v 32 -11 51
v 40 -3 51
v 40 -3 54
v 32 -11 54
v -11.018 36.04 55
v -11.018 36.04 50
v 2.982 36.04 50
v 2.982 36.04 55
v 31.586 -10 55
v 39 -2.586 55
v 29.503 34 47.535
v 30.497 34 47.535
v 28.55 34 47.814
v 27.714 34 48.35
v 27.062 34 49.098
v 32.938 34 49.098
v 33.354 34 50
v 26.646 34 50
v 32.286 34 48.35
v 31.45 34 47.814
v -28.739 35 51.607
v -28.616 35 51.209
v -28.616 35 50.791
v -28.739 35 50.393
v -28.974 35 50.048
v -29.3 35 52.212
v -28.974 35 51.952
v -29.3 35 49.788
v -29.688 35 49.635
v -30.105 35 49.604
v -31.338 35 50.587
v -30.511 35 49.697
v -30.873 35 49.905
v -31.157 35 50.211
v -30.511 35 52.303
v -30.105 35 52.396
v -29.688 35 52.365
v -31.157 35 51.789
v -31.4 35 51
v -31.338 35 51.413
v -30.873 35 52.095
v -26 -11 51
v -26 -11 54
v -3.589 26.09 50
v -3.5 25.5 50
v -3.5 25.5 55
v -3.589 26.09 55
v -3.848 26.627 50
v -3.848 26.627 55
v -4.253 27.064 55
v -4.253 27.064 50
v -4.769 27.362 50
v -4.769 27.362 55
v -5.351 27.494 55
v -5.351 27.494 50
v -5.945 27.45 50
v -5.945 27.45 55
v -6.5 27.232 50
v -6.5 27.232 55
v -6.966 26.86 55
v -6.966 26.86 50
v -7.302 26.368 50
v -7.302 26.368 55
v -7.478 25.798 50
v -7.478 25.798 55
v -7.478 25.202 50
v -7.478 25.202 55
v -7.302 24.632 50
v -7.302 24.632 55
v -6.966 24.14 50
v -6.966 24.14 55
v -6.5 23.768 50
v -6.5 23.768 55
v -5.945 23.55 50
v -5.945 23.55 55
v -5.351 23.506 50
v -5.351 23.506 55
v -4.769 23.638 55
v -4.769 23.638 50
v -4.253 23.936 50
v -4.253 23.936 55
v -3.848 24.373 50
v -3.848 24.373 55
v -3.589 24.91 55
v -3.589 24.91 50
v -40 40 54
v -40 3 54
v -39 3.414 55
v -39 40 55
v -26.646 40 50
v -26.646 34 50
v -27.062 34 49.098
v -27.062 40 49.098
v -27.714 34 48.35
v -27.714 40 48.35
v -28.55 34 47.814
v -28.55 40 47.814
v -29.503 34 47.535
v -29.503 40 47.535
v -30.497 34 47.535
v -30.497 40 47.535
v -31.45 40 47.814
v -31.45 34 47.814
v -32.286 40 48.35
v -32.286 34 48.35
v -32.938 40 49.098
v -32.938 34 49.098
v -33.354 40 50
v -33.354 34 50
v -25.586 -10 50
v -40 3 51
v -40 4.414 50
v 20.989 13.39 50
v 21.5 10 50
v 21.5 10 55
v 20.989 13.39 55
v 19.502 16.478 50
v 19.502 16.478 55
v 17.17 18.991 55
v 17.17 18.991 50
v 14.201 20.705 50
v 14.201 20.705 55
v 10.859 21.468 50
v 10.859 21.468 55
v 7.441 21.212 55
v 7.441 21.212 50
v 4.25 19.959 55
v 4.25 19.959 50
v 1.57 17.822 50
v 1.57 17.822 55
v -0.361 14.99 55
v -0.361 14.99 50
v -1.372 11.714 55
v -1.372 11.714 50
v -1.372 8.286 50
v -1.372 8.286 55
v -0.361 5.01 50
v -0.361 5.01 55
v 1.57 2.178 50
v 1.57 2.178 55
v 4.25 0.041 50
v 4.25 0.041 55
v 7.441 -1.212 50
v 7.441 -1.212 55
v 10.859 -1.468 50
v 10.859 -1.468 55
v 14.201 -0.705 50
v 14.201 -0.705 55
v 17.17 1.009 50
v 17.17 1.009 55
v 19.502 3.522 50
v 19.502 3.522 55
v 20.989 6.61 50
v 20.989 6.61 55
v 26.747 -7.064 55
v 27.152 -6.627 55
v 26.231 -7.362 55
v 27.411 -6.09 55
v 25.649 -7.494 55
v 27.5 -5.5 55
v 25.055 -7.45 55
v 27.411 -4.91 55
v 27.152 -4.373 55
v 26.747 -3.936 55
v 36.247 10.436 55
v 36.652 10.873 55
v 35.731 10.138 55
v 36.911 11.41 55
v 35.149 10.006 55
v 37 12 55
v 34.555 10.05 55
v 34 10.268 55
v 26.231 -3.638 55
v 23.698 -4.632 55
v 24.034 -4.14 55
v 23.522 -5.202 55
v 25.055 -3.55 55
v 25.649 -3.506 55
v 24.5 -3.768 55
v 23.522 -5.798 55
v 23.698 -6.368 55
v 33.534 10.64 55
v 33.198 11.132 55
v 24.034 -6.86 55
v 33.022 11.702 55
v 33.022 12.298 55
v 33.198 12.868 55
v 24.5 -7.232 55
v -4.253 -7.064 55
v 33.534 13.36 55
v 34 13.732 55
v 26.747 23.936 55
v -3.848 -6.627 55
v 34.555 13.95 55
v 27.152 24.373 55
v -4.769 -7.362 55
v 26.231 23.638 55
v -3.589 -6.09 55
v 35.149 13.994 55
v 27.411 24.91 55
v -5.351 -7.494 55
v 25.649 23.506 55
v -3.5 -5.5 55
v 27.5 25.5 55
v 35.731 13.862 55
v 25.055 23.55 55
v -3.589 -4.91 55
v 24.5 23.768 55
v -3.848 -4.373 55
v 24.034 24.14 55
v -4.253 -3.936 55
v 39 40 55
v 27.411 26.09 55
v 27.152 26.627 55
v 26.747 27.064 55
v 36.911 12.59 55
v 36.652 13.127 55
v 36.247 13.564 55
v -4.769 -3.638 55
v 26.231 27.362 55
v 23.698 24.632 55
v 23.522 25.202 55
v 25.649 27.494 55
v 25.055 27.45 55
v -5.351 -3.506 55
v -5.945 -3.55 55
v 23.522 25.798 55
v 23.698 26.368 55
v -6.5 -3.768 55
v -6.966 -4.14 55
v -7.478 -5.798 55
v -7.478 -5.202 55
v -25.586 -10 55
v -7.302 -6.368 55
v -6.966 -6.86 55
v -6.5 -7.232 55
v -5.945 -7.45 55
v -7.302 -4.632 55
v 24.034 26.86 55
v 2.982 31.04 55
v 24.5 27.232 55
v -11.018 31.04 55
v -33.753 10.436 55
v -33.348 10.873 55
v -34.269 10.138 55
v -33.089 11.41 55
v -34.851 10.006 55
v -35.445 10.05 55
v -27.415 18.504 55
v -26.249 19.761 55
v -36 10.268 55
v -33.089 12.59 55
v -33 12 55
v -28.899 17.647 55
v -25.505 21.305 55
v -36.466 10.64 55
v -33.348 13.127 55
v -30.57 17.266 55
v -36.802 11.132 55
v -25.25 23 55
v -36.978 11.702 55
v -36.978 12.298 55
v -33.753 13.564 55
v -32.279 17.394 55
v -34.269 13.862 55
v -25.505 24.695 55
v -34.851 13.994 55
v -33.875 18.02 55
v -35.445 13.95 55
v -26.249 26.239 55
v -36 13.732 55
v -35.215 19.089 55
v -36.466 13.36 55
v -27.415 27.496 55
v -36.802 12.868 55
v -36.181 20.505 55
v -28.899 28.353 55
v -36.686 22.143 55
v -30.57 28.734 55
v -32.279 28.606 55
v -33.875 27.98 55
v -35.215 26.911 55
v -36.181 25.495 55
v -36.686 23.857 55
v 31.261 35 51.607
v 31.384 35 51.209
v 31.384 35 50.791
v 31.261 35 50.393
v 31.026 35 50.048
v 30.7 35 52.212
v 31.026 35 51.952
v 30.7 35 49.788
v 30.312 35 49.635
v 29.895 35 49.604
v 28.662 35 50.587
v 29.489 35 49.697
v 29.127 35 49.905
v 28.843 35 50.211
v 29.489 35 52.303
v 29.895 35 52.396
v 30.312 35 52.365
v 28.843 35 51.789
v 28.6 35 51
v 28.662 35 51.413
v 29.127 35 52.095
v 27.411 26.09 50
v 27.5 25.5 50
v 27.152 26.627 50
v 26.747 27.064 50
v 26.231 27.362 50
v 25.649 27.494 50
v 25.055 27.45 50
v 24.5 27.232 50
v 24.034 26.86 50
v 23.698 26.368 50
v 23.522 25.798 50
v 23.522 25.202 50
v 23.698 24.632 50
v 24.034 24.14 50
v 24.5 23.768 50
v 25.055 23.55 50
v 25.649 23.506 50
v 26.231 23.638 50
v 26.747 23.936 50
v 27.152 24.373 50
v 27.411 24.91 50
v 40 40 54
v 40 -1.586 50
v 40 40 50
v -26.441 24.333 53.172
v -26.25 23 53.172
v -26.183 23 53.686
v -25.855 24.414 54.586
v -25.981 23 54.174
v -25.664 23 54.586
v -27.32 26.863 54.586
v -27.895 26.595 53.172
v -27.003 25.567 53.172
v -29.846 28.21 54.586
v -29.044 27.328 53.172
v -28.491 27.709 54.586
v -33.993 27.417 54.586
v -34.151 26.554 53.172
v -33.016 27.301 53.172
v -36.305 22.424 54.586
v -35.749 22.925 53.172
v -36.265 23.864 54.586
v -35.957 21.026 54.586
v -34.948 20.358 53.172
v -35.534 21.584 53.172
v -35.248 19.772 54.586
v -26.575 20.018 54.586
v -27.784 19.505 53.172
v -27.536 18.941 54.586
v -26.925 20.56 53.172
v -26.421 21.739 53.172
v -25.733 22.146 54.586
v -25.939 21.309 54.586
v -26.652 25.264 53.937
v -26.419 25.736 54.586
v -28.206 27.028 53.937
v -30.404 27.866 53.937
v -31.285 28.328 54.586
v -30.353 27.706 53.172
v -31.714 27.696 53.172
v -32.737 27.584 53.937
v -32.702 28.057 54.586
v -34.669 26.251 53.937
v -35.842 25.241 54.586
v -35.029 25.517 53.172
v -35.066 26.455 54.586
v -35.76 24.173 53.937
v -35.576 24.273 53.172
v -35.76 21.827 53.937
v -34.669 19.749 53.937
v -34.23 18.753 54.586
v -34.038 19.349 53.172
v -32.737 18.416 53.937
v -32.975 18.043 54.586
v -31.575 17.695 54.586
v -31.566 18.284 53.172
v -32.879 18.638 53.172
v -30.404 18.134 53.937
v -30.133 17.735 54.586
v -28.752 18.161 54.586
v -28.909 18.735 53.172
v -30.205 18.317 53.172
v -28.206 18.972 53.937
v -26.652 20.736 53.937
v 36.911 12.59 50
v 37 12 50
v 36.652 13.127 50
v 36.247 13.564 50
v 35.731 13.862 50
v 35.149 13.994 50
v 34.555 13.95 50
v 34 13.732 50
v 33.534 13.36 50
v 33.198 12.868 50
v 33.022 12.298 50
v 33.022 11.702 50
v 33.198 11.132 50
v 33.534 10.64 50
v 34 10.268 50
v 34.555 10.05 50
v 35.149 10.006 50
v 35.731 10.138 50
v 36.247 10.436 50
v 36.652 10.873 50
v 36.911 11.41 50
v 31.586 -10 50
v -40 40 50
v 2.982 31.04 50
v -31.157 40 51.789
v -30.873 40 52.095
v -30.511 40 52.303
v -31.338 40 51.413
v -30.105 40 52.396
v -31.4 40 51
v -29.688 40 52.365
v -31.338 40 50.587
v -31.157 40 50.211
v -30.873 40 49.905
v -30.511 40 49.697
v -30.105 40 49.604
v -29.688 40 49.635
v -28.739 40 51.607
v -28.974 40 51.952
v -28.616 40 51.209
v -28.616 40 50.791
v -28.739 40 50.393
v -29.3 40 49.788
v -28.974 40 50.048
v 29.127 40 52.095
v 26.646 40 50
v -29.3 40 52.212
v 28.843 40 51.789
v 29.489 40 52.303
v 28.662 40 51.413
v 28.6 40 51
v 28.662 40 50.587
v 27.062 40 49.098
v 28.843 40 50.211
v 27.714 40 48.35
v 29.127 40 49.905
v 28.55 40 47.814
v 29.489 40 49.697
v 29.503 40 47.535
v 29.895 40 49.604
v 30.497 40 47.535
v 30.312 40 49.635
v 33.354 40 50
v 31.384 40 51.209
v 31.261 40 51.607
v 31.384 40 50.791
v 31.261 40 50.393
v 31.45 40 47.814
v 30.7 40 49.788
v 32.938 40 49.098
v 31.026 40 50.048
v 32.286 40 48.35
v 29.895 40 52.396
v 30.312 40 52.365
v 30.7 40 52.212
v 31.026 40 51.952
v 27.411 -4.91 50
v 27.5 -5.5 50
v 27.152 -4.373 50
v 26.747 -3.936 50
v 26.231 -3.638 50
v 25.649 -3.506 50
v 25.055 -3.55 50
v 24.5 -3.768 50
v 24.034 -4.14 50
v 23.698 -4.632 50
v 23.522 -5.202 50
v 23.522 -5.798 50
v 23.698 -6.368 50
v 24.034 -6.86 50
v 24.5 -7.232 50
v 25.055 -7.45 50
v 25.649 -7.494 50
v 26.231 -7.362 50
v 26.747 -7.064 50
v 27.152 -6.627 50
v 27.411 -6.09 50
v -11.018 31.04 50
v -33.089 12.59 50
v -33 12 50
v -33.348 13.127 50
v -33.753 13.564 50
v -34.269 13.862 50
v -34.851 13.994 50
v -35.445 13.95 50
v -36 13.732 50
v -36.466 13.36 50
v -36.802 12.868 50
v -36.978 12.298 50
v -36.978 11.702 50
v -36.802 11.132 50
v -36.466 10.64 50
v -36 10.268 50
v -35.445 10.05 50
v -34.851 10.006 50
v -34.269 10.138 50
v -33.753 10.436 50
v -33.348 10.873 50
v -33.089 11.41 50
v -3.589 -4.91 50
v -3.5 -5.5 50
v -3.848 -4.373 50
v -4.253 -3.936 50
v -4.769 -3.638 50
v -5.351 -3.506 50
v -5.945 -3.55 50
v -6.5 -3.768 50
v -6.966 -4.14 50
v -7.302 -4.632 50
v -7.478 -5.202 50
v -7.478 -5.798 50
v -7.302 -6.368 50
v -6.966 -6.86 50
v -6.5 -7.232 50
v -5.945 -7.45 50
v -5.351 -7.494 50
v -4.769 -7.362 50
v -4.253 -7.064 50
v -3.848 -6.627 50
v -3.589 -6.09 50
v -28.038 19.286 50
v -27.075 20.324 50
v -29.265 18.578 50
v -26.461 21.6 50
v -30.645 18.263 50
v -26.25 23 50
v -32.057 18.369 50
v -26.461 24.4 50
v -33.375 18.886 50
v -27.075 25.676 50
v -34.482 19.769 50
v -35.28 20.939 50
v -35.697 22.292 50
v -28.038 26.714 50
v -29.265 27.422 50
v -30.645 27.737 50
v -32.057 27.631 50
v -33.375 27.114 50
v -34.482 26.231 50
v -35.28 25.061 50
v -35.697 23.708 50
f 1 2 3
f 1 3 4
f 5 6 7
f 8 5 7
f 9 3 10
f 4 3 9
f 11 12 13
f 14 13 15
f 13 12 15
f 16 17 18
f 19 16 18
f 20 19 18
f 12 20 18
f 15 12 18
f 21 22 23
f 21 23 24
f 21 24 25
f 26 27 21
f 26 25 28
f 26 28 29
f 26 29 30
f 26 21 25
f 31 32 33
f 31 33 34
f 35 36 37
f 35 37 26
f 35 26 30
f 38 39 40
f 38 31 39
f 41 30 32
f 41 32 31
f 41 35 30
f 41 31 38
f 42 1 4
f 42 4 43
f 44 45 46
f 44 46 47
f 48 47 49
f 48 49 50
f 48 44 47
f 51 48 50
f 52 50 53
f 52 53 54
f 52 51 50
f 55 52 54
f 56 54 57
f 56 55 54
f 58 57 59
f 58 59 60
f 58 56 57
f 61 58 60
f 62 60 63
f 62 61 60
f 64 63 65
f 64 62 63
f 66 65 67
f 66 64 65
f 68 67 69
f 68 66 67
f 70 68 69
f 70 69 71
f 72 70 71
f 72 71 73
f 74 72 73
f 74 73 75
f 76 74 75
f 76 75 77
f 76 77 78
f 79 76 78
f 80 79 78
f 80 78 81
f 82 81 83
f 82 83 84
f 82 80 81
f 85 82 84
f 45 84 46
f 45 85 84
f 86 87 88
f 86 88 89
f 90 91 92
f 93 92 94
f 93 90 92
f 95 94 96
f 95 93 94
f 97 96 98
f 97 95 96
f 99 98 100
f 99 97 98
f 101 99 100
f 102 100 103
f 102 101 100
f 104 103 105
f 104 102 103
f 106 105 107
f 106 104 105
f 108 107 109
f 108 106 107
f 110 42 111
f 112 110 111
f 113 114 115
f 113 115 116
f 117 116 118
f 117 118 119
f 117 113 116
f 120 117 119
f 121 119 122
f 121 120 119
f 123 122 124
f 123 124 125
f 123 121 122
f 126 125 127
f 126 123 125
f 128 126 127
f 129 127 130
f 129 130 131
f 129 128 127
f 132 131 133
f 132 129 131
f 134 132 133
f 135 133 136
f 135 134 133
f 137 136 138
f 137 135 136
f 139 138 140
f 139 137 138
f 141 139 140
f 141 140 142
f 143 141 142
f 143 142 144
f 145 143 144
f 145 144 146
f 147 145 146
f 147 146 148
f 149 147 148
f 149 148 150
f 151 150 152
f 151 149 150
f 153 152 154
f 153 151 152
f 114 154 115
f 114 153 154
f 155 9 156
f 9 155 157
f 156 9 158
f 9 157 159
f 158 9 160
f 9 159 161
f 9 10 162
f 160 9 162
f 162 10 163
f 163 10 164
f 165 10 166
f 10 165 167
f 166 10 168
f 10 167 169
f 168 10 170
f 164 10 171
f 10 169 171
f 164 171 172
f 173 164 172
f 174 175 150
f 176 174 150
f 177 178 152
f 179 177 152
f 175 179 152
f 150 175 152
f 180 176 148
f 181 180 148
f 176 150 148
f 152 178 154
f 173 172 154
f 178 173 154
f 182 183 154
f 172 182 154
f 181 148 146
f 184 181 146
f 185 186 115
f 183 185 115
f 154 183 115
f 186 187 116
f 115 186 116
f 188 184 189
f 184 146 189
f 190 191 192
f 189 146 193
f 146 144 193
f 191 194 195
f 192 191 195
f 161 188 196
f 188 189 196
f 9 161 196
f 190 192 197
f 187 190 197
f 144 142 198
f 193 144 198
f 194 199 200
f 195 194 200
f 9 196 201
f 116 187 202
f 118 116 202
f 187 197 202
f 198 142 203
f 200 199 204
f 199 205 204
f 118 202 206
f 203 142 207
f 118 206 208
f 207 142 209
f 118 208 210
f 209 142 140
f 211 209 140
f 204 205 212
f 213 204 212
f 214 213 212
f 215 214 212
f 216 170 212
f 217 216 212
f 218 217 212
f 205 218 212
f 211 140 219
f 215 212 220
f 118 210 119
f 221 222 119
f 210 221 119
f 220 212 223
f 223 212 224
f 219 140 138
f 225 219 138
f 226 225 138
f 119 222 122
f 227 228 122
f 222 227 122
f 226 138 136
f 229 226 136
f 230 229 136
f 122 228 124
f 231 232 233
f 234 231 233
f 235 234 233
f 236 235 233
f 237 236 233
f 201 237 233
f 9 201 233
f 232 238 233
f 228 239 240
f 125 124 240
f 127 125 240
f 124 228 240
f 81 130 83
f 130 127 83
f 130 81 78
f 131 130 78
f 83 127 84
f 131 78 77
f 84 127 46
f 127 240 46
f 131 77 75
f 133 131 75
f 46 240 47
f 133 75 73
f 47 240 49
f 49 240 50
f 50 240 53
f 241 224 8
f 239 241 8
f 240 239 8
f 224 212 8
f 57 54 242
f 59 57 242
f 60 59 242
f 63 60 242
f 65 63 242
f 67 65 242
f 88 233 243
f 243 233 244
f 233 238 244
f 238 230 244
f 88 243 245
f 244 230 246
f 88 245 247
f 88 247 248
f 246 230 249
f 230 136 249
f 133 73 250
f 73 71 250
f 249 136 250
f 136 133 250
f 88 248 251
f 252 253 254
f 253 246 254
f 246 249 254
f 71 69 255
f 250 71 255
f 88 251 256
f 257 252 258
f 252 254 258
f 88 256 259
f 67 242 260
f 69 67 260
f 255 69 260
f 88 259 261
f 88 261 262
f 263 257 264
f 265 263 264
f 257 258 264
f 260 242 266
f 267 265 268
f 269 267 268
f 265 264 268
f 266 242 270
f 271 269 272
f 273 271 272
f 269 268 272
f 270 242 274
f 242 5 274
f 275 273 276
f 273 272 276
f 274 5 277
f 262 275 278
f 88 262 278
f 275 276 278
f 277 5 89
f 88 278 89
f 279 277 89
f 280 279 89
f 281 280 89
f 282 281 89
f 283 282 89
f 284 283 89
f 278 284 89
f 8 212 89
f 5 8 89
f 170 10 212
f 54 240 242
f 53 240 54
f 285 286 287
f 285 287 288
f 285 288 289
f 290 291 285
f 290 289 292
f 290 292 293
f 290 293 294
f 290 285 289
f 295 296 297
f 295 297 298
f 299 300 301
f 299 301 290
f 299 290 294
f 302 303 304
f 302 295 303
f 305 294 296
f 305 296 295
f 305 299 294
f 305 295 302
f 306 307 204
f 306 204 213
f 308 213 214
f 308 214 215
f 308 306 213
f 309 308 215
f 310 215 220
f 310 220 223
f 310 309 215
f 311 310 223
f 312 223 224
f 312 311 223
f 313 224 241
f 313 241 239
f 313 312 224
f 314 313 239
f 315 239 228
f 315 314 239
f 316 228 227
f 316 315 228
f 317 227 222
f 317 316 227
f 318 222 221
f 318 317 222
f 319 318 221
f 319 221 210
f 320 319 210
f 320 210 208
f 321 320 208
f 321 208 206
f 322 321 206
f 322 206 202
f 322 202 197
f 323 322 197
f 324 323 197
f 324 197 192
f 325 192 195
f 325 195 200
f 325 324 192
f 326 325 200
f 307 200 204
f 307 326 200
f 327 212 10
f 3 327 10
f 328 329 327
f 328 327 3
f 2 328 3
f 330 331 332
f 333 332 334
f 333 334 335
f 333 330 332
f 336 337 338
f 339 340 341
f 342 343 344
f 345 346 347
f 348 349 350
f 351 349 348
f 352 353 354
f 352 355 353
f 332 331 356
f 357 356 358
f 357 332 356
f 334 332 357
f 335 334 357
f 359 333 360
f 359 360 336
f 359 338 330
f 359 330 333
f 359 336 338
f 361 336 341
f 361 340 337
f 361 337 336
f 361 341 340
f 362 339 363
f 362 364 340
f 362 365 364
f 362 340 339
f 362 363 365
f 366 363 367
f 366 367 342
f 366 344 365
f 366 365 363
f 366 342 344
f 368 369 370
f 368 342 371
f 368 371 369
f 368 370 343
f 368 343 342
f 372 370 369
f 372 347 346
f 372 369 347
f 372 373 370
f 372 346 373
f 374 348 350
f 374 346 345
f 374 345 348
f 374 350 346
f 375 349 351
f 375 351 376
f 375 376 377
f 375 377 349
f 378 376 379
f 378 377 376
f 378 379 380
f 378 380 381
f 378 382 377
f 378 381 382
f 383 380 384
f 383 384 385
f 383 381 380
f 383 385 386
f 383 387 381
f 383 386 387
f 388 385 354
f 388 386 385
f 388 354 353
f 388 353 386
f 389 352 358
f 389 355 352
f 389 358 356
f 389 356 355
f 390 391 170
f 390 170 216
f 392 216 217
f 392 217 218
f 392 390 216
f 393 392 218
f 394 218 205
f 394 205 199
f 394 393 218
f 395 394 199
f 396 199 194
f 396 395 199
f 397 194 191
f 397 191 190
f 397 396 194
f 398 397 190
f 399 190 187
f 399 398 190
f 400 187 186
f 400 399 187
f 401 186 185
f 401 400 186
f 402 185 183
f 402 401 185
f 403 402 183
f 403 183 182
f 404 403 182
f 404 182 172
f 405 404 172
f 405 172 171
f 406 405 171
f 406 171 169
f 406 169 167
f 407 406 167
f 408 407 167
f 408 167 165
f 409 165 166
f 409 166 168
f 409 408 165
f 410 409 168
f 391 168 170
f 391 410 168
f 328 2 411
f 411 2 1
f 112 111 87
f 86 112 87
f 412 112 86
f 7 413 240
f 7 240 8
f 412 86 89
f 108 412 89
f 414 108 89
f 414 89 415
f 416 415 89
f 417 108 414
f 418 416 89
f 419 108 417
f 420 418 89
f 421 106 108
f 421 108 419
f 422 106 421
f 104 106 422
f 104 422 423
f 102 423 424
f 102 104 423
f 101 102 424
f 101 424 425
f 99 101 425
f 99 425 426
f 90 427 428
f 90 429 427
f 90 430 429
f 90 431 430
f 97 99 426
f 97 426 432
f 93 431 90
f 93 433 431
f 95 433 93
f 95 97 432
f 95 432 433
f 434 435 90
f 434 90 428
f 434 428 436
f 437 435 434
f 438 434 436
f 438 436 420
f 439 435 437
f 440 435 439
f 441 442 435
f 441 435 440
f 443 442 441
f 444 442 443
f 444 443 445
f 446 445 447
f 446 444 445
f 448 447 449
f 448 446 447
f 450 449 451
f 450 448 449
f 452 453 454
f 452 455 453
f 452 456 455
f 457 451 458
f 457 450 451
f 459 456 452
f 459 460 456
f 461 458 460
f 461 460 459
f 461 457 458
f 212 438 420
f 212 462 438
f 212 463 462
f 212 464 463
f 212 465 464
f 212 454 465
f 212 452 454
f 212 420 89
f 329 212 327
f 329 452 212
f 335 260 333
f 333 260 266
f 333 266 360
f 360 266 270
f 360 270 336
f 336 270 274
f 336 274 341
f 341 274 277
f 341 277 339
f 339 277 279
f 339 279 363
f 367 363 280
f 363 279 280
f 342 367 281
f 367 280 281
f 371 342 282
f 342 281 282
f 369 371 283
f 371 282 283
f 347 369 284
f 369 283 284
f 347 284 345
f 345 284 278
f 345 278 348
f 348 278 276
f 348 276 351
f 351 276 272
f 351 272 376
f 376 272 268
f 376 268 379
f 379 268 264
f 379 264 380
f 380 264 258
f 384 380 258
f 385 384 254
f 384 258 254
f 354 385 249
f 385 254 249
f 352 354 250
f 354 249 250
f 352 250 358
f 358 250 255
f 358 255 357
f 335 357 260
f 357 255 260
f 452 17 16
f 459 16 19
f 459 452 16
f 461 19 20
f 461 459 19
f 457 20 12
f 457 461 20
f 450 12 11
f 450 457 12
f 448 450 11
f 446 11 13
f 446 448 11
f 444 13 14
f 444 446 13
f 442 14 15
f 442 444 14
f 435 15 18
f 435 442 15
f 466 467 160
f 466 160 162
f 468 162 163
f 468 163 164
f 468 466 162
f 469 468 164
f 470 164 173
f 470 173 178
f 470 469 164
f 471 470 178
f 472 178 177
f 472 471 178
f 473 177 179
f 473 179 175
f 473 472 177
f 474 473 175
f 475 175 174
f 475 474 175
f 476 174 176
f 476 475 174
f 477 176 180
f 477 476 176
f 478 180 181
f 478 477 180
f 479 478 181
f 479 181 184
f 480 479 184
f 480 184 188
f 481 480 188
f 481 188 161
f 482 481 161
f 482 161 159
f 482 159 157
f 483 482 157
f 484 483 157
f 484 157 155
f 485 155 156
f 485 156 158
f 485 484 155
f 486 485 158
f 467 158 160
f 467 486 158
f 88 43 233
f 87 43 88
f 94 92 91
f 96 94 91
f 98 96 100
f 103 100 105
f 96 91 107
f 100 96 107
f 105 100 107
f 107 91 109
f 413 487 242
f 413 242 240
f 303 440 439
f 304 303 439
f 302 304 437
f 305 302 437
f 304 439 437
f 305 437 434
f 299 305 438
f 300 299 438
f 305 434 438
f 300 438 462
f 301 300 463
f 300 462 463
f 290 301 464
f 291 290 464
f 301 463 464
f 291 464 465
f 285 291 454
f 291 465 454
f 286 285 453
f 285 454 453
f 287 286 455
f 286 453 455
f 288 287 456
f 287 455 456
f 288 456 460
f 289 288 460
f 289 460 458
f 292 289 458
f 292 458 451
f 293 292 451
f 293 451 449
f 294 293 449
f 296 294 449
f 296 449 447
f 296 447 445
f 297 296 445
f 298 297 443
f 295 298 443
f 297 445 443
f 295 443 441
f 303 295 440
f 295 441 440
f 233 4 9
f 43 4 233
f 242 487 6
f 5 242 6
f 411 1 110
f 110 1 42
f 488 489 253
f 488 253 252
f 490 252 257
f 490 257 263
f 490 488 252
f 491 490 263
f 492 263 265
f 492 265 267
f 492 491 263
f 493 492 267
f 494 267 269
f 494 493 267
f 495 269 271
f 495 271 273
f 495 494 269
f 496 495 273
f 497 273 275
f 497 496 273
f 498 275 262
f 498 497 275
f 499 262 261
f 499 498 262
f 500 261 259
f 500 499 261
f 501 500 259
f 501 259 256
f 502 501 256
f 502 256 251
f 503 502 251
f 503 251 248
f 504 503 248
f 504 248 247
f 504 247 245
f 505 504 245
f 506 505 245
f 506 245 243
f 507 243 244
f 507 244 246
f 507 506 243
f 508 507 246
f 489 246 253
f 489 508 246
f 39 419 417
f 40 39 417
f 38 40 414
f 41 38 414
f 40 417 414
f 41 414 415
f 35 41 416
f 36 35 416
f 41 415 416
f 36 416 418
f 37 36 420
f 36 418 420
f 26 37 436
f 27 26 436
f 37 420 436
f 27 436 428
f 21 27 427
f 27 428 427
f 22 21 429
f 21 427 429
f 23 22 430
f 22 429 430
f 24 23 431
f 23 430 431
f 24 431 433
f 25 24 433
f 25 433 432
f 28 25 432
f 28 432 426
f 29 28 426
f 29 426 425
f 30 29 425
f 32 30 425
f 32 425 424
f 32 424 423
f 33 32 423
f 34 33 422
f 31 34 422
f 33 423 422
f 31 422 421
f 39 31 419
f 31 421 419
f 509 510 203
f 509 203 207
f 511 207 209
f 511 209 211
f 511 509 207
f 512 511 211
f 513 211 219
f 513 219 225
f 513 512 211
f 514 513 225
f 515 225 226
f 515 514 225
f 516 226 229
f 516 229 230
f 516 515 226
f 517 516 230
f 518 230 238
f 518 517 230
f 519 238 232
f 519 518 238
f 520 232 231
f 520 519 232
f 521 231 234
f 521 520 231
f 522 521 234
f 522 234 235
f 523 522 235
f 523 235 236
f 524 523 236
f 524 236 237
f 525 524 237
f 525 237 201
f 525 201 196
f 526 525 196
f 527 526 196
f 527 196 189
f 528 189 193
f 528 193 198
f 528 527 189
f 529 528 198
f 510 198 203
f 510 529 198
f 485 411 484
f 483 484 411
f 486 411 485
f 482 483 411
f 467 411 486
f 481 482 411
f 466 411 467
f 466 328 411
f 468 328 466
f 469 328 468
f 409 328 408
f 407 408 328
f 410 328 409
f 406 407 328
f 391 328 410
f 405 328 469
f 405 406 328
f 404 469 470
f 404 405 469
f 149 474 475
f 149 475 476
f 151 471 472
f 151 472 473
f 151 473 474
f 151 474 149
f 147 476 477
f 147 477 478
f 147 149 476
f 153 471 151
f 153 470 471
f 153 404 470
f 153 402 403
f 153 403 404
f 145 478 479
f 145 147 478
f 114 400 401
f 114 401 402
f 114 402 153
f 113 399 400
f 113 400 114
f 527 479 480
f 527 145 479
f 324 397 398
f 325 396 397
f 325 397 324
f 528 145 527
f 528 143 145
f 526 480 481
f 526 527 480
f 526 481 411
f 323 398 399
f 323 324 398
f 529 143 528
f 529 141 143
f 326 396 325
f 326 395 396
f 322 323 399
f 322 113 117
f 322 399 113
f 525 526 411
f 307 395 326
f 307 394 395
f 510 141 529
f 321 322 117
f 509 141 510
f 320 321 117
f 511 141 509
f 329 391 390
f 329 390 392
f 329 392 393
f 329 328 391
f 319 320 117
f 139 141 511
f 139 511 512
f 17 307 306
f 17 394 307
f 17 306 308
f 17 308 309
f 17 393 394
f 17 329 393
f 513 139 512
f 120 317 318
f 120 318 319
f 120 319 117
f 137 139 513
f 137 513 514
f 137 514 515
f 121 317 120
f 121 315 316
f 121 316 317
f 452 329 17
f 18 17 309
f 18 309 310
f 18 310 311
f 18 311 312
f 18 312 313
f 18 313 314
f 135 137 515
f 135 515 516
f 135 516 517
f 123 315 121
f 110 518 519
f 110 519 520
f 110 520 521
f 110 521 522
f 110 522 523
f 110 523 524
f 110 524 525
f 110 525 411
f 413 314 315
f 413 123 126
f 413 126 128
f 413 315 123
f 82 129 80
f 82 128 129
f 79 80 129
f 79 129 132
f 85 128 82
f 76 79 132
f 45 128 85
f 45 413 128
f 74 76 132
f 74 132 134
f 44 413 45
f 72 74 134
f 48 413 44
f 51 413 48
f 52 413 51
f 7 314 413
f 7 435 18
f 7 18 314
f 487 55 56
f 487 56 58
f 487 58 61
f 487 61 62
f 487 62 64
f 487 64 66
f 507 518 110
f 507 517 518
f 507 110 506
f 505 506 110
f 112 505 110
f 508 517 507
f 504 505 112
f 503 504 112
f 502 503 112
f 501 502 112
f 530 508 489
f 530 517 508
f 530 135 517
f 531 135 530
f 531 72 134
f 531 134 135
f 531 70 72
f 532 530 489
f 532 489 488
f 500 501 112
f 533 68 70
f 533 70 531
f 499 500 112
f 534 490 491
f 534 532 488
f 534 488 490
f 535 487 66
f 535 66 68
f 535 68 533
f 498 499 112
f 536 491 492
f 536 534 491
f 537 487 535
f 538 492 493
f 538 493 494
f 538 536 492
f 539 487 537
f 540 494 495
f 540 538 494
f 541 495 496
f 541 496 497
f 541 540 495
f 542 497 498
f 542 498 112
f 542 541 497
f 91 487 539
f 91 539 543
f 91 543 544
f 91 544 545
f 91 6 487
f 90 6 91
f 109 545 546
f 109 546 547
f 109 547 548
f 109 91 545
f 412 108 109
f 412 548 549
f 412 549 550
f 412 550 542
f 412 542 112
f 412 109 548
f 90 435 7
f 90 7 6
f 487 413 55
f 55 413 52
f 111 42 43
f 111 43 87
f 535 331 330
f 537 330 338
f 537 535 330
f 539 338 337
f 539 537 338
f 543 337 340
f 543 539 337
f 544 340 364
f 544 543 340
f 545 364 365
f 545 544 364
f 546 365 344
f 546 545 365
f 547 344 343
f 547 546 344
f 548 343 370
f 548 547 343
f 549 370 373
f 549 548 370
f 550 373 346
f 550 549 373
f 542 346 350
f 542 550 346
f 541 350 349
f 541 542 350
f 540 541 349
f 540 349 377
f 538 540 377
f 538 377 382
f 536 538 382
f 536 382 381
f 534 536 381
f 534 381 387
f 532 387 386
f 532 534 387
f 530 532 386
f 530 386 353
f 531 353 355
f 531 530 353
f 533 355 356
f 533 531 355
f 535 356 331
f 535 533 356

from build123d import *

# Parameters (mm, degrees)
SKETCH003_R     = 11.5
SKETCH003_R_2   = 2
SKETCH003_R_3   = 4.75
SKETCH003_W     = 14
SKETCH003_H     = 5
PAD001_DEPTH    = 5
PAD013_DEPTH    = 6
SKETCH048_R     = 1.4
POCKET038_DEPTH = 5
CHAMFER019_SIZE = 1
CHAMFER020_SIZE = 1
CHAMFER021_SIZE = 1
FILLET_R        = 2


with BuildPart() as part:
    # Sketch003 → Pad001 (new body)
    with BuildSketch(Plane.XY):
        Polygon((-40, 40), (40, 40), (40, -3), (32, -11), (-26, -11), (-40, 3), align=None)
        with Locations((10, 10)):
            Circle(SKETCH003_R, mode=Mode.SUBTRACT)
        with Locations((-35, 12)):
            Circle(SKETCH003_R_2, mode=Mode.SUBTRACT)
        with Locations((35, 12)):
            Circle(SKETCH003_R_2, mode=Mode.SUBTRACT)
        with Locations((25.5, -5.5)):
            Circle(SKETCH003_R_2, mode=Mode.SUBTRACT)
        with Locations((-5.5, 25.5)):
            Circle(SKETCH003_R_2, mode=Mode.SUBTRACT)
        with Locations((-31, 23)):
            Circle(SKETCH003_R_3, mode=Mode.SUBTRACT)
        with Locations((25.5, 25.5)):
            Circle(SKETCH003_R_2, mode=Mode.SUBTRACT)
        with Locations((-5.5, -5.5)):
            Circle(SKETCH003_R_2, mode=Mode.SUBTRACT)
        with Locations((-4.017783, 33.539897)):
            Rectangle(SKETCH003_W, SKETCH003_H, mode=Mode.SUBTRACT)
    extrude(amount=PAD001_DEPTH)

    # Sketch047 → Pad013 (join)
    with BuildSketch(Plane(origin=(0, 40, 0), x_dir=(-1, 0, 0), z_dir=(0, 1, 0))):
        with BuildLine():
            ThreePointArc((-33.5, 1.000024), (-30, -2.5), (-26.5, 1.000024))
            Line((-33.5, 1.000024), (-26.5, 1.000024))
        make_face()
        with BuildLine():
            ThreePointArc((26.5, 1.000024), (30, -2.5), (33.5, 1.000024))
            Line((26.5, 1.000024), (33.5, 1.000024))
        make_face()
    extrude(amount=-PAD013_DEPTH)

    # Sketch048 → Pocket038 (cut)
    with BuildSketch(Plane(origin=(0, 40, 0), x_dir=(-1, 0, 0), z_dir=(0, 1, 0))):
        with Locations((-30, 1)):
            Circle(SKETCH048_R)
        with Locations((30, 1)):
            Circle(SKETCH048_R)
    extrude(amount=-POCKET038_DEPTH, mode=Mode.SUBTRACT)

    # Chamfer019
    chamfer019_edges = [part.edges().sort_by_distance(p)[0] for p in [
        (40, 18.5, 5),
        (-40, 21.5, 5),
        (-33, -4, 5),
        (3, -11, 5),
        (36, -7, 5),
    ]]
    chamfer(chamfer019_edges, length=CHAMFER019_SIZE)

    # Chamfer020
    chamfer020_edges = [part.edges().sort_by_distance(p)[0] for p in [
        (36, -7, 0),
        (3, -11, 0),
        (-33, -4, 0),
    ]]
    chamfer(chamfer020_edges, length=CHAMFER020_SIZE)

    # Chamfer021
    chamfer021_edges = [part.edges().sort_by_distance(p)[0] for p in [
        (-35.75, 23, 5),
    ]]
    chamfer(chamfer021_edges, length=CHAMFER021_SIZE)

    # Fillet
    fillet_edges = [part.edges().sort_by_distance(p)[0] for p in [
        (-35.75, 23, 4),
    ]]
    fillet(fillet_edges, radius=FILLET_R)


with BuildPart() as part_1:
    # Body001 placement: moved
    add(part.part.moved(Location((0, 0, 50))))


solid = part_1.part
